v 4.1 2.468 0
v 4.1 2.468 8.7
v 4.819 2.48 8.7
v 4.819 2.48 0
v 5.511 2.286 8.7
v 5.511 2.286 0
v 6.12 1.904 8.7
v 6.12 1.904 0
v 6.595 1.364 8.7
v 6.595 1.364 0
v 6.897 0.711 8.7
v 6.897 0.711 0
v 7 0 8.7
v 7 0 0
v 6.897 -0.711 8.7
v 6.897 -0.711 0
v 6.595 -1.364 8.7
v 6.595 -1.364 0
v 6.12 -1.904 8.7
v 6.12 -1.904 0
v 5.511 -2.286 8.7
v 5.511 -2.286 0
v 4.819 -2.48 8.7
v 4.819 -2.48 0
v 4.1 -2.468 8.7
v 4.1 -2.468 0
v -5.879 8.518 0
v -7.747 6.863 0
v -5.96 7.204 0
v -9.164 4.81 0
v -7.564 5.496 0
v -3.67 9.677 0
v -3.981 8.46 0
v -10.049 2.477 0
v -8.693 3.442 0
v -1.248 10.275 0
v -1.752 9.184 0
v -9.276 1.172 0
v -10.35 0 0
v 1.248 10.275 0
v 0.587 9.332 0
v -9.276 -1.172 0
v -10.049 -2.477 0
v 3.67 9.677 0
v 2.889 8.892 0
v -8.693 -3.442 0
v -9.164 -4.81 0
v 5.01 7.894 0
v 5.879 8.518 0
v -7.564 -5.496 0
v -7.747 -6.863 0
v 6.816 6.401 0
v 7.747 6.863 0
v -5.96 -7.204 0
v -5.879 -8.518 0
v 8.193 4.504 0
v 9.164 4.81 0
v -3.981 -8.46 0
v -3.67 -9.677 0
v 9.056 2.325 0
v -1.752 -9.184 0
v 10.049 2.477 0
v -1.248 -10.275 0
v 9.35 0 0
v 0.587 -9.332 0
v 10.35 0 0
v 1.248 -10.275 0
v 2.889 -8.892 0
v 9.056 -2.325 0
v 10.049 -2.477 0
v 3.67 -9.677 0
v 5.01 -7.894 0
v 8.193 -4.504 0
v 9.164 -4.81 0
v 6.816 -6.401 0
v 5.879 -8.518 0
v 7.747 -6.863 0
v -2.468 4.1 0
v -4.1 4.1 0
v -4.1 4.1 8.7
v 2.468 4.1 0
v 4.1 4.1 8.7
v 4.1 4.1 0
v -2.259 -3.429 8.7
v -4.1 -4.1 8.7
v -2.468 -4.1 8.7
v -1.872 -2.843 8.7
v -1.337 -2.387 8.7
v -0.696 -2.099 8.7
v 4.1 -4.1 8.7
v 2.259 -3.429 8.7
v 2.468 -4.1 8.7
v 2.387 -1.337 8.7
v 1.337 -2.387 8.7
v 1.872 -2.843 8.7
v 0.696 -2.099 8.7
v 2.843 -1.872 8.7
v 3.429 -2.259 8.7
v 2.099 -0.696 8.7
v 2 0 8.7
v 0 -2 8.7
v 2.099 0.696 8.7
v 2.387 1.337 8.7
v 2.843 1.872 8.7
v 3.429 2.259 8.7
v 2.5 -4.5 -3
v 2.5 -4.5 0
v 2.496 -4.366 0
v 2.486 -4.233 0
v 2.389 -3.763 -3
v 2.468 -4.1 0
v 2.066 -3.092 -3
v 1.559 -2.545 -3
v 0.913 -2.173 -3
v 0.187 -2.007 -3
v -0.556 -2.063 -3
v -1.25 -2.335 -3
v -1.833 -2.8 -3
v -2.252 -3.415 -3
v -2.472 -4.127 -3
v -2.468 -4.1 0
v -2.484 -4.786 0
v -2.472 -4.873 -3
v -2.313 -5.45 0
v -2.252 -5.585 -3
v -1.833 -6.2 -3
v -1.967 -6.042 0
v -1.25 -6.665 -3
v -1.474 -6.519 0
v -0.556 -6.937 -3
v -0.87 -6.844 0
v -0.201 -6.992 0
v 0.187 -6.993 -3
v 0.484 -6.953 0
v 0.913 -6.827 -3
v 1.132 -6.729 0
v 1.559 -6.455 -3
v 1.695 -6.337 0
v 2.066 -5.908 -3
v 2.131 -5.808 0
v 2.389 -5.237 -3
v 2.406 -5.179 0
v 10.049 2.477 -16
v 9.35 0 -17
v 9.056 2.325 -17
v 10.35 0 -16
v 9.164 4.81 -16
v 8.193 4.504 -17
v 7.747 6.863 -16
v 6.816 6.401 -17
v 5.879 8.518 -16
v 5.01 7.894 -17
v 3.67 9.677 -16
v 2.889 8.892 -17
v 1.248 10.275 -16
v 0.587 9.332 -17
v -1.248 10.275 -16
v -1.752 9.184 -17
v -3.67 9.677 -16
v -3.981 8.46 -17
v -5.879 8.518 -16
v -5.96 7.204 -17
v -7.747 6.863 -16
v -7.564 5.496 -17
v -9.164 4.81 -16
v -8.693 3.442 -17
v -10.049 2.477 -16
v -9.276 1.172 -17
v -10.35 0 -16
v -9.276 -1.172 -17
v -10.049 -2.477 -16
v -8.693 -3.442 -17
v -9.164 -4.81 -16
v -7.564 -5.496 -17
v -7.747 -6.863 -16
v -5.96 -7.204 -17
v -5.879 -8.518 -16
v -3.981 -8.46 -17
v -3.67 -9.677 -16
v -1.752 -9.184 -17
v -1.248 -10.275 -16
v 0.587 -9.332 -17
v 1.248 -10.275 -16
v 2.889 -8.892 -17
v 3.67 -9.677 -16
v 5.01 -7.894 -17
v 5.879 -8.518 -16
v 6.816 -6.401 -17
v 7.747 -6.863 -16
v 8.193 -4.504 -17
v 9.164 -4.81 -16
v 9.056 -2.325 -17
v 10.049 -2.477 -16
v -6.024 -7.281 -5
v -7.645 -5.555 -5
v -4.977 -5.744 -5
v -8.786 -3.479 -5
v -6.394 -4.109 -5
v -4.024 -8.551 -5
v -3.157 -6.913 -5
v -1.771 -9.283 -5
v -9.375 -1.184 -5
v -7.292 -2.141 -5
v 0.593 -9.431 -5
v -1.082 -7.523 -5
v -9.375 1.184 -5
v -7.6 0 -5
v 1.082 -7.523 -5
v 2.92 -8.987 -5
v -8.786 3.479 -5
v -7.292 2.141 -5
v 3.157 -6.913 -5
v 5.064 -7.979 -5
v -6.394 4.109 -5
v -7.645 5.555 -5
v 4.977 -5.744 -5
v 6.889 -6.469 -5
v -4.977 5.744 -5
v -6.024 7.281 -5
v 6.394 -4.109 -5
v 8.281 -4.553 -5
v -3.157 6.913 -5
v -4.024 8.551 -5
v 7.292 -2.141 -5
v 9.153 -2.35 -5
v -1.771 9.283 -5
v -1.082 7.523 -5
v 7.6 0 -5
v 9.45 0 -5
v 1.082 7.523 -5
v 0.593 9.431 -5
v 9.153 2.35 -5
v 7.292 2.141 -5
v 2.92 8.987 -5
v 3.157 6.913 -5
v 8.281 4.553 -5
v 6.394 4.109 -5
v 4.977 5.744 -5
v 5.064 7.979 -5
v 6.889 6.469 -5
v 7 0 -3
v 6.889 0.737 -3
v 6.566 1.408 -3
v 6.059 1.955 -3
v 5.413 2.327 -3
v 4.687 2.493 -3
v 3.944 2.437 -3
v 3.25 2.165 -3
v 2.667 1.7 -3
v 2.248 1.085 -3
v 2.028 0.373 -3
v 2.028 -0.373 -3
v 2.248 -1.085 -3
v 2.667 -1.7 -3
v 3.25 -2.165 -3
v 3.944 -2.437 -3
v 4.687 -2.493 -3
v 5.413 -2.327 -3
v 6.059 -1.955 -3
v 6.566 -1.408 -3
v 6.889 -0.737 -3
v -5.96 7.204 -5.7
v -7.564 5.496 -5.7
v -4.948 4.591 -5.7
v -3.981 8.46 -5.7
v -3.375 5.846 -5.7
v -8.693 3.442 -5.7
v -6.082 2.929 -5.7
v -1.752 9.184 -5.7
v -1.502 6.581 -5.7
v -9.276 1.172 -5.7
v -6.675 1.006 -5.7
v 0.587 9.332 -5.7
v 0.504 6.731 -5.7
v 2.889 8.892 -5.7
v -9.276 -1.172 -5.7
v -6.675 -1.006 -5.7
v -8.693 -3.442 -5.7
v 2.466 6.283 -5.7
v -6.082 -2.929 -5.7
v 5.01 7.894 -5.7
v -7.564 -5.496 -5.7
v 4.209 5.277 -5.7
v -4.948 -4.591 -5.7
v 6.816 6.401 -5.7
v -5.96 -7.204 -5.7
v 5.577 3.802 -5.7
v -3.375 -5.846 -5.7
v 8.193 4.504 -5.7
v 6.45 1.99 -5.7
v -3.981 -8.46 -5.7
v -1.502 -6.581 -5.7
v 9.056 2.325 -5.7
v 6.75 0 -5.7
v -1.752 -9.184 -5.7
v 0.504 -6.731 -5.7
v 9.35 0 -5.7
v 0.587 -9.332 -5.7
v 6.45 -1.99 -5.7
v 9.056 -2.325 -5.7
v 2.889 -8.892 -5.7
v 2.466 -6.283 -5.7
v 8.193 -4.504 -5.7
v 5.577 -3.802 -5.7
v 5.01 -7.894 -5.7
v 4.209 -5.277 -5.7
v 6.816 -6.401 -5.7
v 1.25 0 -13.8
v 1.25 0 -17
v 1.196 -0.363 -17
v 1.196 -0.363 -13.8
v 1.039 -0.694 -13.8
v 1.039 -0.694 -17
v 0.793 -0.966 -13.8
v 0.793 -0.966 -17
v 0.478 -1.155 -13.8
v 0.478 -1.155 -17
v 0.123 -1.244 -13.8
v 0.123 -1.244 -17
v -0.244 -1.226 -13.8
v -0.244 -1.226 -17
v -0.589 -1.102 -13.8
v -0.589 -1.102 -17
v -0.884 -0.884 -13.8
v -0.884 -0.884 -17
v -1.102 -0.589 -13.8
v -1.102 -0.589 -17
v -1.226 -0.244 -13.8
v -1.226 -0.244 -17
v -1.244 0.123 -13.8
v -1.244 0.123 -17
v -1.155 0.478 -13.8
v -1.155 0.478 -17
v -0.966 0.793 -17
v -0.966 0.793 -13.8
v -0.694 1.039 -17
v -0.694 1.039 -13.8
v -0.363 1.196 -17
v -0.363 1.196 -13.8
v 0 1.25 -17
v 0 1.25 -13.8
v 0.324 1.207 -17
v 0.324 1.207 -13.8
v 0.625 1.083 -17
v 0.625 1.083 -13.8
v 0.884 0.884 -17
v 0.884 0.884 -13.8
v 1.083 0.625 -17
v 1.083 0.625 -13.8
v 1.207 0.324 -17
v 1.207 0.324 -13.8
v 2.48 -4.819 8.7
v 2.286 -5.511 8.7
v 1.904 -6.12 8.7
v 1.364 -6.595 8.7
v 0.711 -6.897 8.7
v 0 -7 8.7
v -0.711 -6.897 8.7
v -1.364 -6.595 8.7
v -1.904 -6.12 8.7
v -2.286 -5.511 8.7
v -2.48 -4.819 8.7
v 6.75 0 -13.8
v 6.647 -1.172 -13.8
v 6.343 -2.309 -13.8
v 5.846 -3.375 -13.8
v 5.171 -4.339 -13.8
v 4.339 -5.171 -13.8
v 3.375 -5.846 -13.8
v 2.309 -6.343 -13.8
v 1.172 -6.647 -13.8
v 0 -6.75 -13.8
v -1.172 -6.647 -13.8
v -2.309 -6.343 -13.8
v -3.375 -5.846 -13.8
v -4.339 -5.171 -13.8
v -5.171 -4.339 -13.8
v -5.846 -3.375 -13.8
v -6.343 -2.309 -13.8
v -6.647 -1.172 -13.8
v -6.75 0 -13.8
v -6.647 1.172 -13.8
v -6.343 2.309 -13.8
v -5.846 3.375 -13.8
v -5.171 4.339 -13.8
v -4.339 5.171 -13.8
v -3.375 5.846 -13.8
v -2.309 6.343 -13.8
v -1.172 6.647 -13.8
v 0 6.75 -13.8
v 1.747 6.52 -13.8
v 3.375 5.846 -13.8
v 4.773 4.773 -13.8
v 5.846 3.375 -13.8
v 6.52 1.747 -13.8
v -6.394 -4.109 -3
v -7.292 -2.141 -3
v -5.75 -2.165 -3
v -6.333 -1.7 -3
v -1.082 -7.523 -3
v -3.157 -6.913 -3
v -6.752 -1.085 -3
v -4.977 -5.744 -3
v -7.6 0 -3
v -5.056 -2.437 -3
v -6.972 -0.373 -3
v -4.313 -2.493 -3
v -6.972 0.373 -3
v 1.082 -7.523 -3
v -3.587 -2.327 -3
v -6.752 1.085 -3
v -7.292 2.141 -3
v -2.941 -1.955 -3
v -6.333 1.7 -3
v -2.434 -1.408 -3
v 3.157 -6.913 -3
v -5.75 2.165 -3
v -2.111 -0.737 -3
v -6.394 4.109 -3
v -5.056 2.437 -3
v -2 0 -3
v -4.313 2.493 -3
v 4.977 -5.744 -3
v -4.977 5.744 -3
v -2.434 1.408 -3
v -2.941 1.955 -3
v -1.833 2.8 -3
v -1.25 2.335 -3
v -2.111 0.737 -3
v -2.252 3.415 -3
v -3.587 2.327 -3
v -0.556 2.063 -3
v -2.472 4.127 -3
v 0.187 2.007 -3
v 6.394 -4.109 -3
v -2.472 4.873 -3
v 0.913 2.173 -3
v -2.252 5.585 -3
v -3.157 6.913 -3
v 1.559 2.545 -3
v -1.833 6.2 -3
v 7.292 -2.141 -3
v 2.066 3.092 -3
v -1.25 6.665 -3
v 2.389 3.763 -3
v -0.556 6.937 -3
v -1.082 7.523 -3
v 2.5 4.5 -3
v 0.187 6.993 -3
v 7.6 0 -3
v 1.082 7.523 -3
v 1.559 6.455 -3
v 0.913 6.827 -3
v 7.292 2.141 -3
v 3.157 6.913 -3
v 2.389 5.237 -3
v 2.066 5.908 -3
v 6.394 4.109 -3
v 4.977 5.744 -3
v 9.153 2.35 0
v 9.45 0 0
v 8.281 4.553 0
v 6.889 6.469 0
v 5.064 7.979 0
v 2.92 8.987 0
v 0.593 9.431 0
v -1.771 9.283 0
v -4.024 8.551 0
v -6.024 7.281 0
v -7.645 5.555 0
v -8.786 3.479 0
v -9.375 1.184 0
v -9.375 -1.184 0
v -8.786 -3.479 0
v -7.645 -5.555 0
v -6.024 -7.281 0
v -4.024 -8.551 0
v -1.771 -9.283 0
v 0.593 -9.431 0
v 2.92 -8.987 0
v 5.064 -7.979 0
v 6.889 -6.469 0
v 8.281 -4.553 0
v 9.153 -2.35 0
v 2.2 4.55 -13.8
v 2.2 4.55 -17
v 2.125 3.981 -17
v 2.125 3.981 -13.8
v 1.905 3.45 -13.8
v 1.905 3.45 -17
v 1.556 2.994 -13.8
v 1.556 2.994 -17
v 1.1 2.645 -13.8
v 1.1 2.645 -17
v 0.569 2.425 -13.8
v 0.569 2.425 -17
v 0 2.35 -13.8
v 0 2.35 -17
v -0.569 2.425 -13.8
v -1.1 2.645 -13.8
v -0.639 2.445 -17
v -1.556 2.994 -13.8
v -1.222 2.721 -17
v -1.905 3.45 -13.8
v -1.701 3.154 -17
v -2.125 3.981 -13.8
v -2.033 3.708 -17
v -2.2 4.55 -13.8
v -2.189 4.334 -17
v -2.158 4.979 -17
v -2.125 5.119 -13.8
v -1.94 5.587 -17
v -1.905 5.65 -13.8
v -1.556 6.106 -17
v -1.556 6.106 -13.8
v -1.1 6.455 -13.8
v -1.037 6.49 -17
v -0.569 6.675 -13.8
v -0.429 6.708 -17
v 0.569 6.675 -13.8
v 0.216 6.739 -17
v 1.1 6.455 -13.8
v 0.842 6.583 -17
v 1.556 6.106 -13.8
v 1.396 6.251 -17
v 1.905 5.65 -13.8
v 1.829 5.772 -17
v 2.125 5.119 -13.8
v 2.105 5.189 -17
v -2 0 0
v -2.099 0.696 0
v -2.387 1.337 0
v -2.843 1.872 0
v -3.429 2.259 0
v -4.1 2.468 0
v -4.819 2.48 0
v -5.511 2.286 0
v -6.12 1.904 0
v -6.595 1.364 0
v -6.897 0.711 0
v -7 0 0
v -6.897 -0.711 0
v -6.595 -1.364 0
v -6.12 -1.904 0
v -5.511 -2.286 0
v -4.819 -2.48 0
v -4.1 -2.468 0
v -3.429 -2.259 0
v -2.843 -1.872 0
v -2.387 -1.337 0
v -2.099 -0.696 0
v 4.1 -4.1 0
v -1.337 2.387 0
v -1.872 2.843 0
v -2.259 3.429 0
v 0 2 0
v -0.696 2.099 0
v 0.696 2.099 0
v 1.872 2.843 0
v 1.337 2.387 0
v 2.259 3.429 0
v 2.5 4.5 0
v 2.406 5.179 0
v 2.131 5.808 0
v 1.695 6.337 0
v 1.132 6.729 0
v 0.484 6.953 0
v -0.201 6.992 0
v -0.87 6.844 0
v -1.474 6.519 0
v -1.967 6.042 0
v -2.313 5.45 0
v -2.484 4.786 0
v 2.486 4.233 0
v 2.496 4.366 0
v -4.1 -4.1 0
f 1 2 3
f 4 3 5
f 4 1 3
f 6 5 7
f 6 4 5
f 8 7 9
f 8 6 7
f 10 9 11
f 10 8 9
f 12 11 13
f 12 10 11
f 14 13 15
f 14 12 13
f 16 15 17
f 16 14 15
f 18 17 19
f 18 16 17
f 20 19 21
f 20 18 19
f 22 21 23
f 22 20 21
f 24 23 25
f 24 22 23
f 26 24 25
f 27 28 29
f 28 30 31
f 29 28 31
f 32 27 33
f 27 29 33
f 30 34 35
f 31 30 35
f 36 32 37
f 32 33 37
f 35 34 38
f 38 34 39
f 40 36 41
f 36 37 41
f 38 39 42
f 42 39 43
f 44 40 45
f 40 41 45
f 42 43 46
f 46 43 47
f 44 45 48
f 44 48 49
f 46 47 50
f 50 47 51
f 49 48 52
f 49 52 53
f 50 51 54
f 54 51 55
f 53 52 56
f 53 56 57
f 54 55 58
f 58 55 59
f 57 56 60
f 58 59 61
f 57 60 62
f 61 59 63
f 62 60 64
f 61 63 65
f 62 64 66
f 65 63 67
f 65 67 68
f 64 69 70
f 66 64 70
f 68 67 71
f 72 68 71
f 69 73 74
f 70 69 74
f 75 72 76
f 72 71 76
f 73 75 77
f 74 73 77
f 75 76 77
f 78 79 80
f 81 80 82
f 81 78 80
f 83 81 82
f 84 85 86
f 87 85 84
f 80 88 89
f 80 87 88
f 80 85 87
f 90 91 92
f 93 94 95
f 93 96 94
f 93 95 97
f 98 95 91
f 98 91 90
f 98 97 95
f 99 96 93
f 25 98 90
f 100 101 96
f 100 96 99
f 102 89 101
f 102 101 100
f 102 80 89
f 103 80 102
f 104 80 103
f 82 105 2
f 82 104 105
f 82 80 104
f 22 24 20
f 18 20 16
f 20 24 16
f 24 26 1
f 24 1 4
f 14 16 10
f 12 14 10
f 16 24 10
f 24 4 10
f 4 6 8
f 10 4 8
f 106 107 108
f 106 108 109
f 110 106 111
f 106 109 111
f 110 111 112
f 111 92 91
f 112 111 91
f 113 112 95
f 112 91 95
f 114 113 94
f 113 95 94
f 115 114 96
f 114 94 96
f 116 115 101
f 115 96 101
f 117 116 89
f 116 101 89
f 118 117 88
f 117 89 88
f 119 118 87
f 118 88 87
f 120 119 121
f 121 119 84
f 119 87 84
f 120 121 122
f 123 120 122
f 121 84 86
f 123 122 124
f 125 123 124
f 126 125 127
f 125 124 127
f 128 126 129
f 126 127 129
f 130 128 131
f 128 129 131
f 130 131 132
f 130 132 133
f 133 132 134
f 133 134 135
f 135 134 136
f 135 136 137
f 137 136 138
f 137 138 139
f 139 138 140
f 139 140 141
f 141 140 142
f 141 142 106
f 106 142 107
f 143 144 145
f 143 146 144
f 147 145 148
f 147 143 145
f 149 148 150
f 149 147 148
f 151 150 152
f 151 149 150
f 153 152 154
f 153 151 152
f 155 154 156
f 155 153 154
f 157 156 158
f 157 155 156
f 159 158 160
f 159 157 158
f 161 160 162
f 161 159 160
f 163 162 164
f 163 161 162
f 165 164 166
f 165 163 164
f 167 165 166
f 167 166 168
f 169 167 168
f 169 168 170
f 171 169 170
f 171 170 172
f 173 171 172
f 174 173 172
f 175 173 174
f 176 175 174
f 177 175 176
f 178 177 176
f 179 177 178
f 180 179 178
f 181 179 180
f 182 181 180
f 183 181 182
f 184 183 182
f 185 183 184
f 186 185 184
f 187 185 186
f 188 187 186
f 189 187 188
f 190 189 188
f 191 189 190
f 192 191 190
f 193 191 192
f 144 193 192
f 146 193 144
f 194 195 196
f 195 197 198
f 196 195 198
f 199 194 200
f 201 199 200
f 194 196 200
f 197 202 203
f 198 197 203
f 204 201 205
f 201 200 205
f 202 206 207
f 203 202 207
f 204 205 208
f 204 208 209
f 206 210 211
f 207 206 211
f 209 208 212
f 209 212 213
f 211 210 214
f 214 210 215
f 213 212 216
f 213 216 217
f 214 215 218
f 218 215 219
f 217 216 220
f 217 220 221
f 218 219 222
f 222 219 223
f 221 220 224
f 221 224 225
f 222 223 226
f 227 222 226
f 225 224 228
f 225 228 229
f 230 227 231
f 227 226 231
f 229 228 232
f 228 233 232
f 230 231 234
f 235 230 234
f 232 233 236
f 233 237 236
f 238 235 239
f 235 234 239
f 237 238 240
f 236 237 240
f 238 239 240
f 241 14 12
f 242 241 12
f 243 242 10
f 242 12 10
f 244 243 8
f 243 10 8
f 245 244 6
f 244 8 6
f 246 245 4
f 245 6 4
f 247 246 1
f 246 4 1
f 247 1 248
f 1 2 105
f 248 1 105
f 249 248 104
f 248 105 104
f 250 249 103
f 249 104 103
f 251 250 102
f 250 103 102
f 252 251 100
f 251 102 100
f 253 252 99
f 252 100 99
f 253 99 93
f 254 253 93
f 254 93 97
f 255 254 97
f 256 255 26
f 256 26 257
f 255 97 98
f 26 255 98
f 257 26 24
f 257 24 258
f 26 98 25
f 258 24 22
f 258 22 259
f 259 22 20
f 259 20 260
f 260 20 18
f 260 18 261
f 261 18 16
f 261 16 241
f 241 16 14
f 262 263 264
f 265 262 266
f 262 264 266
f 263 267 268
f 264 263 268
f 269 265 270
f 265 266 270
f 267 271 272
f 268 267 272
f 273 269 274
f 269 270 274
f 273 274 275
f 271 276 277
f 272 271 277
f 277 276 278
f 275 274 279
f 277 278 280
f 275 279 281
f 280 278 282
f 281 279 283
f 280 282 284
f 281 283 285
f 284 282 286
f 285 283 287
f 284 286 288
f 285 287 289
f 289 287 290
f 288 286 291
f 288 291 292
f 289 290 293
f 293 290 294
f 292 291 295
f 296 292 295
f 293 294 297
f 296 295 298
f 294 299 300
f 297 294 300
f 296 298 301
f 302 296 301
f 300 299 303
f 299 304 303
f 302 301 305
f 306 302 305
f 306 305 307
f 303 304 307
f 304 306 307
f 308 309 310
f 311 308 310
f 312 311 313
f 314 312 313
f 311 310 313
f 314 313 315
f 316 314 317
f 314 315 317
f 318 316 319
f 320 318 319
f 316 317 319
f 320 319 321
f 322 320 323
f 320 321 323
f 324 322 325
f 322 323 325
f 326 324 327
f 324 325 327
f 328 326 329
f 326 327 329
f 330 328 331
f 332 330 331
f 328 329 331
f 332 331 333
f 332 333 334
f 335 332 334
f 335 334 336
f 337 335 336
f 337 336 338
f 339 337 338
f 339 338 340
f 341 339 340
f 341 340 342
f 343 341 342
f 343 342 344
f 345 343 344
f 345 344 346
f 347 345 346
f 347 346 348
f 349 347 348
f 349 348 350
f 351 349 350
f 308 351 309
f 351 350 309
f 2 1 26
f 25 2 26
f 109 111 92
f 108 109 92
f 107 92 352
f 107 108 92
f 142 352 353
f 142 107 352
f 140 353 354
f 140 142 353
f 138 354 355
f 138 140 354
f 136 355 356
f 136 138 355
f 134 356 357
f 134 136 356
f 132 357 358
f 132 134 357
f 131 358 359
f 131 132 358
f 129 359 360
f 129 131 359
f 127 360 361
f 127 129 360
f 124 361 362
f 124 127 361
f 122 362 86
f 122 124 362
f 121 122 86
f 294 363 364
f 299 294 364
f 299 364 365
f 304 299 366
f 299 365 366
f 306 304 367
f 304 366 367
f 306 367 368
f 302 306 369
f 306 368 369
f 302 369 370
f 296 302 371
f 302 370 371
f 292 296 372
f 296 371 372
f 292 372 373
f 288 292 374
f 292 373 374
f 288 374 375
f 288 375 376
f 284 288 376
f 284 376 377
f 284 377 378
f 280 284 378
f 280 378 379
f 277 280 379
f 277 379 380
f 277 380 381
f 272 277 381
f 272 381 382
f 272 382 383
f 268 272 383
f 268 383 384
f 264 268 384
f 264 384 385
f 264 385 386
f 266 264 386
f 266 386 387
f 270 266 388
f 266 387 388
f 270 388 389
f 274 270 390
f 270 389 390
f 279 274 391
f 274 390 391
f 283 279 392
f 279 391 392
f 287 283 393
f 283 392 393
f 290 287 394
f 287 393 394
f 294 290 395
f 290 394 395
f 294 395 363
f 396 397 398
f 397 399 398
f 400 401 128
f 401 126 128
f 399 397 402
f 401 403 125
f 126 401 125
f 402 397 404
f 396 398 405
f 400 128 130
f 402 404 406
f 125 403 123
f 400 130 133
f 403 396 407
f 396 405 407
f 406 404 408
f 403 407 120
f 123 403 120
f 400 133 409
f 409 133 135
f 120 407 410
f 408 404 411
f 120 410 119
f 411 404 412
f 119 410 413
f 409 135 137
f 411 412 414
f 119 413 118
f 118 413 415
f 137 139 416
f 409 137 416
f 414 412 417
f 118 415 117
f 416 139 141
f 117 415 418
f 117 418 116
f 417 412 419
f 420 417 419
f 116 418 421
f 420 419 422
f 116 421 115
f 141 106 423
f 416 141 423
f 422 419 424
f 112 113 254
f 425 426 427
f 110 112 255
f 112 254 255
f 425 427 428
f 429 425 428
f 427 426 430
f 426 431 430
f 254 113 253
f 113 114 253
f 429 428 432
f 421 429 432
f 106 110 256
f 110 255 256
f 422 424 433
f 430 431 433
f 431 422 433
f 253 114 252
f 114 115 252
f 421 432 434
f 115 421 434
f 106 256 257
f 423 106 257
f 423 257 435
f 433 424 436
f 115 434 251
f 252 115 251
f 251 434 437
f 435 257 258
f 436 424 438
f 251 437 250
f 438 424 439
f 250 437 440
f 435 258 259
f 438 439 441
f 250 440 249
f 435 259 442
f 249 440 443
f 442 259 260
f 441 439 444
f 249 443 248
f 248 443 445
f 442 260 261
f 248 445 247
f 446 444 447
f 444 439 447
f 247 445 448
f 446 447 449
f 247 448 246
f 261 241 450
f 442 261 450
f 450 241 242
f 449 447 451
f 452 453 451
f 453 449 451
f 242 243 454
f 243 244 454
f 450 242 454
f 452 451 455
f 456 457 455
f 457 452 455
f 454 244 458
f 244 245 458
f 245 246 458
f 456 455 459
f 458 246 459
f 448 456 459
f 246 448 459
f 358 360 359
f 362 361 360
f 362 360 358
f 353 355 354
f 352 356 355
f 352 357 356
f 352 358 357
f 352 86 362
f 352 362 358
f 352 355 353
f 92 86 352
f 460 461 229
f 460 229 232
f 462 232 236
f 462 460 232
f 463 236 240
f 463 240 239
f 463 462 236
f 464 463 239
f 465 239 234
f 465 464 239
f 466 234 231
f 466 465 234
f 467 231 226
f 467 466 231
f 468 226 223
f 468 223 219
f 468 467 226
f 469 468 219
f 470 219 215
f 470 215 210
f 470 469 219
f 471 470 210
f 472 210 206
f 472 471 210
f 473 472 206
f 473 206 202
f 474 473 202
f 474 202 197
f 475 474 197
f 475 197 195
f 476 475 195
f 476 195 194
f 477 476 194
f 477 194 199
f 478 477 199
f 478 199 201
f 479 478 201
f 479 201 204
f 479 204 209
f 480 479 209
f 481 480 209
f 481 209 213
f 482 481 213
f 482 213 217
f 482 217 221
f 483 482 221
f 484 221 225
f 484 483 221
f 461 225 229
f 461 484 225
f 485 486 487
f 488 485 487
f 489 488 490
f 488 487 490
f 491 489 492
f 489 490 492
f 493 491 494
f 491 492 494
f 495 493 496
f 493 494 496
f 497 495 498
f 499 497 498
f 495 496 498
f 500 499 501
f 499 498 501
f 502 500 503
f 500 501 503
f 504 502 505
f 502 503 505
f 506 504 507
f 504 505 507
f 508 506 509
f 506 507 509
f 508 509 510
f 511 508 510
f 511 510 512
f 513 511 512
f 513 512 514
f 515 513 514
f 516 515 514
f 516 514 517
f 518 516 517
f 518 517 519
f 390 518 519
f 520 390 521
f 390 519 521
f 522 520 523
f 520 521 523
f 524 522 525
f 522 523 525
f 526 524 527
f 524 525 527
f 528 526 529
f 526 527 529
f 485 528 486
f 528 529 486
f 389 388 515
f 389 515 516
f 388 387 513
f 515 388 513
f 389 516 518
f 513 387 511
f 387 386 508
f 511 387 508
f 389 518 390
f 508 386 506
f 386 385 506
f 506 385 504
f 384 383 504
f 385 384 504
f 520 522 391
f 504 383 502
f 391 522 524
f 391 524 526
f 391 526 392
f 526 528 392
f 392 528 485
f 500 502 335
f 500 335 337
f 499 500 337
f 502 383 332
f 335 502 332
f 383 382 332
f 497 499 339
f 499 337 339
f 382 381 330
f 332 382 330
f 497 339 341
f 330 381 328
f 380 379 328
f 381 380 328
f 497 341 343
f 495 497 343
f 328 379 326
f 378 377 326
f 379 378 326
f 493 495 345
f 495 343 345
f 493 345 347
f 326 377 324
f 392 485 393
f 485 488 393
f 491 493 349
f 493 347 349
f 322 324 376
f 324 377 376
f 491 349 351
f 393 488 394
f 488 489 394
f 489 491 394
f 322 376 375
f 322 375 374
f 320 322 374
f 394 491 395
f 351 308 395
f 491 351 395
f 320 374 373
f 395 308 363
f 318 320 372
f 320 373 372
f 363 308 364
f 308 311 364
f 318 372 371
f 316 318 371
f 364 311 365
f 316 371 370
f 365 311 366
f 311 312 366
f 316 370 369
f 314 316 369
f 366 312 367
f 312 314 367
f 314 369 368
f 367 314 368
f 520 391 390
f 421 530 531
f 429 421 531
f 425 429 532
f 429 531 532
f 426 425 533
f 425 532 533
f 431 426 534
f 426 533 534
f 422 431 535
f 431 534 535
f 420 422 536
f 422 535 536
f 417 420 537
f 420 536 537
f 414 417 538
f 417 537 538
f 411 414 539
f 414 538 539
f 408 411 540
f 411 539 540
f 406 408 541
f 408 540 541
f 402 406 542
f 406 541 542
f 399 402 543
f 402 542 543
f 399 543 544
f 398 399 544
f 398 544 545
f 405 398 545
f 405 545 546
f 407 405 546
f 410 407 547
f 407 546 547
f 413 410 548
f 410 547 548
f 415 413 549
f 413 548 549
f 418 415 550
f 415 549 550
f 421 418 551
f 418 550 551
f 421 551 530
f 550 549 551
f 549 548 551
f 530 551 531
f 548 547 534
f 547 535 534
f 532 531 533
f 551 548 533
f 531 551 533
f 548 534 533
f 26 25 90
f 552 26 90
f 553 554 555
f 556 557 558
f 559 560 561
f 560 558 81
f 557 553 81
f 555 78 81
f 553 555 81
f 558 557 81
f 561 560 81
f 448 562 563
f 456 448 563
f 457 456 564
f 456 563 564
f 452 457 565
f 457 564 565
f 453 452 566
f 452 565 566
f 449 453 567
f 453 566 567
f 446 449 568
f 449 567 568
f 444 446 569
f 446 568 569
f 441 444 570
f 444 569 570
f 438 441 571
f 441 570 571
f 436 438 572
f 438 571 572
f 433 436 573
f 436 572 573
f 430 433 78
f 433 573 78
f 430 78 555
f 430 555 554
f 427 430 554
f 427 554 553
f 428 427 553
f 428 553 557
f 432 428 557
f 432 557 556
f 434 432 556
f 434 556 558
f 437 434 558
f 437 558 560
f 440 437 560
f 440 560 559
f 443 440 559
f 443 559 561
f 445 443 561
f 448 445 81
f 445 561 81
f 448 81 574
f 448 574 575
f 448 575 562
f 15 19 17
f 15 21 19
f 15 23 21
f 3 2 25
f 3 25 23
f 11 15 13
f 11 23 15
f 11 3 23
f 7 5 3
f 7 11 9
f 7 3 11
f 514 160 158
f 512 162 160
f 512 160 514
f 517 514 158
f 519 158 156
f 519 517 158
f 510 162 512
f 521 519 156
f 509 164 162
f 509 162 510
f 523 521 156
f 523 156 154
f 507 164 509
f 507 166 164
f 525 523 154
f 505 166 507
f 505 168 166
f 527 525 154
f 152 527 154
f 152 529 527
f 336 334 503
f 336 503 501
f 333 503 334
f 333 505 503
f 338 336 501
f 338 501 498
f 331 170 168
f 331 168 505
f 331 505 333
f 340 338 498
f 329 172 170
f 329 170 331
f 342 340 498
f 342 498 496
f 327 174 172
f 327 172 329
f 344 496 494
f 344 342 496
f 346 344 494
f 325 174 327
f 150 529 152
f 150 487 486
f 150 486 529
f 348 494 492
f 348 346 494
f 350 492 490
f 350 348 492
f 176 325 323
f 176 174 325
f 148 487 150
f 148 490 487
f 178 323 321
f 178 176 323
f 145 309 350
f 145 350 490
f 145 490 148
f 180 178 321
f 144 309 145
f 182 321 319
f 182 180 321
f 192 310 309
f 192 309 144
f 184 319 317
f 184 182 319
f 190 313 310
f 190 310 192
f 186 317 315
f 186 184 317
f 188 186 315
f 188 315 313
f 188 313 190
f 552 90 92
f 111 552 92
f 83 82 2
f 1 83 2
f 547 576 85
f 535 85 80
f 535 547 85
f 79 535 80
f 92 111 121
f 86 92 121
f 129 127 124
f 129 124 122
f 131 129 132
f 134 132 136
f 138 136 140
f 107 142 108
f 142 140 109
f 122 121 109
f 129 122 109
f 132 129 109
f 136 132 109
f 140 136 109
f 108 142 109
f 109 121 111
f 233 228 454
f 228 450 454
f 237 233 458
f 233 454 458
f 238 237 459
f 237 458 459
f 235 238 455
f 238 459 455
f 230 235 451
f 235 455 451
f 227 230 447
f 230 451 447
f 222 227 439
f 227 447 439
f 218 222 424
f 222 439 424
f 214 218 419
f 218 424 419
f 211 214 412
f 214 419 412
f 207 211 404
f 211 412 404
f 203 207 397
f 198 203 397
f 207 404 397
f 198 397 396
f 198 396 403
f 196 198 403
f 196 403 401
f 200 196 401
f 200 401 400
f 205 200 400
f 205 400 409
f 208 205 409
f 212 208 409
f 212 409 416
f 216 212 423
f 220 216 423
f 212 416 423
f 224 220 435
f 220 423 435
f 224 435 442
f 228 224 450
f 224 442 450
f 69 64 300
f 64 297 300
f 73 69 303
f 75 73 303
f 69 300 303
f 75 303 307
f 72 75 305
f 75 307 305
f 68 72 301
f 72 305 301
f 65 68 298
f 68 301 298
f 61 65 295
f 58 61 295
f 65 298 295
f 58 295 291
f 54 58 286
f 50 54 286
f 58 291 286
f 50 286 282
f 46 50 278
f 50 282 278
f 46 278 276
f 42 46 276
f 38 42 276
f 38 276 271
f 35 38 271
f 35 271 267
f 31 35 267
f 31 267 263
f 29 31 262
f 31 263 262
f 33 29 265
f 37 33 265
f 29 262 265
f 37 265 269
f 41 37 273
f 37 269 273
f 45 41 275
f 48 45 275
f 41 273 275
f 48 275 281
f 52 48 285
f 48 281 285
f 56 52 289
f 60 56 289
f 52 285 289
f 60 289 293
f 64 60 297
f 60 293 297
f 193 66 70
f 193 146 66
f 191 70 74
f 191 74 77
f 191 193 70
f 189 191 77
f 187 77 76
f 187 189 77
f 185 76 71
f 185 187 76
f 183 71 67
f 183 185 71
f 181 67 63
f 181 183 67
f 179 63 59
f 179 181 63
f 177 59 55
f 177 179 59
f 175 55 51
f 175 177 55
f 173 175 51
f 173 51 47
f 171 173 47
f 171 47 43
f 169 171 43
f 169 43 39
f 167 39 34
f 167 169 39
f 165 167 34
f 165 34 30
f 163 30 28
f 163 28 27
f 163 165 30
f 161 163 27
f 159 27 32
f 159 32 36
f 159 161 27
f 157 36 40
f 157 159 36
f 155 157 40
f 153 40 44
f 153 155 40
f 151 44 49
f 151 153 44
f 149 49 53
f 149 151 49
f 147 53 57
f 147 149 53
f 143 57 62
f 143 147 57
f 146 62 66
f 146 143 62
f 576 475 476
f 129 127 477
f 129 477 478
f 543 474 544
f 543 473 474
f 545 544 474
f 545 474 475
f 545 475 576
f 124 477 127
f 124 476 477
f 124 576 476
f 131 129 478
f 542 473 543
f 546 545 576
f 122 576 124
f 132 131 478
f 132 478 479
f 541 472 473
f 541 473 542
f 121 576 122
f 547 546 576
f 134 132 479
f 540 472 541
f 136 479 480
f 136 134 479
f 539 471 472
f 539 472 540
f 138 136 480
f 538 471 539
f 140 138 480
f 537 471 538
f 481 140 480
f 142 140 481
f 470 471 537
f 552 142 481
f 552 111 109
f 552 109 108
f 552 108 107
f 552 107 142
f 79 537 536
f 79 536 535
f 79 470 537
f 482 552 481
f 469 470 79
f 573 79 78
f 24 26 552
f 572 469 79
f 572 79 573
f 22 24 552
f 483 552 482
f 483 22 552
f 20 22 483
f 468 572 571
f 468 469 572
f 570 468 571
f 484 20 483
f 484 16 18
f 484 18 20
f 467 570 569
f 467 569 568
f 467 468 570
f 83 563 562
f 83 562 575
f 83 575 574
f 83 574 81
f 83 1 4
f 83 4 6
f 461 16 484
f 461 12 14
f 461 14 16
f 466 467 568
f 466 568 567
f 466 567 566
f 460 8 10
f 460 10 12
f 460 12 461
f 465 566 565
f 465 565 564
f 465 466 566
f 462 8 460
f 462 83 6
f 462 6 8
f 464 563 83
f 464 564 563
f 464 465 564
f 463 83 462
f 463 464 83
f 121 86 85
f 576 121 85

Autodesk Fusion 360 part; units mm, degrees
sketch "Skizze1" plane through (0, 0, 0) normal (0, 0, 1) x (1, 0, 0)
  circle A0 centre (0, 0) radius 9.45
  line L0 (-4.1, 4.1) -> (4.1, 4.1)
  line L1 (4.1, 4.1) -> (4.1, -4.1)
  line L2 (4.1, -4.1) -> (-4.1, -4.1)
  line L3 (-4.1, -4.1) -> (-4.1, 4.1)
  line L4 (-4.1, 0) -> (4.1, 0) construction
  line L5 (0, 4.1) -> (0, -4.1) construction
  circle A1 centre (4.5, 0) radius 2.5
  circle A2 centre (0, 4.5) radius 2.5
  circle A3 centre (-4.5, 0) radius 2.5
  circle A4 centre (0, -4.5) radius 2.5
  circle A5 centre (0, 0) radius 7.6
  dimension "d18" = 18.9
  dimension "d19" = 8.2
  dimension "d20" = 8.2
  dimension "d21" = 5
  dimension "d22" = 4.5
  dimension "d24" = 360
  dimension "d25" = 15.2
extrude "Extrusion1" add sketch "Skizze1" against normal blind 3 contours A0 | L0 L1 L2 L3 A1 A2 A3 A4 | A5 makes body 1
extrude "Extrusion2" add sketch "Skizze1" against normal blind 5 contours A0 bodies 1
extrude "Extrusion3" add sketch "Skizze1" along normal blind 8.7 contours L0 L1 L2 L3 A1 A2 A3 A4 | L0 A2 | L3 A3 | L1 A1 | L2 A4 picked at (-0.6822, 3.4278) picked at (-2.9892, -0.0816) picked at (5.1777, 0.1304) picked at (-0.1263, -5.057) bodies 1
sketch "Skizze2" plane through (0, 0, 0) normal (0, 0, 1) x (1, 0, 0)
  circle A0 centre (0, 0) radius 10.35
  circle A1 centre (0, 0) radius 9.35
  circle A2 centre (0, 0) radius 6.75
  circle A3 centre (0, 0) radius 1.25
  circle A4 centre (0, -4.55) radius 2.2
  line L0 (0, -4.55) -> (0, 0)
  dimension "d32" = 20.7
  dimension "d33" = 18.7
  dimension "d34" = 13.5
  dimension "d35" = 2.5
  dimension "d36" = 4.4
extrude "Extrusion4" add sketch "Skizze2" against normal blind 17 separate body contours A0 makes body 2
extrude "Extrusion6" add sketch "Skizze2" against normal blind 11.3 contours A1 bodies 2
extrude "Extrusion7" add sketch "Skizze2" against normal blind 3.2 contours A2 bodies 2
thread "Gewinde1"
chamfer "Fase1" distance 1 angle 45 1 edges at (-9.6496, -3.7427, 0) on bodies 2
copy_body "Körper->Berechn1" bodies 1 removing the originals makes body 3 in component "lid"
copy_body "Körper->Berechn2" bodies 2 removing the originals makes body 4 in component "body"
component "lid" placed x (1, 0, 0) y (0, 1, 0) z (0, 0, 1) at (0, 0, 0)
component "body" placed x (1, 0, 0) y (0, -1, 0) z (0, 0, -1) at (0, 0, -17)
equation "d22 = ( 14 / 2 ) * 1 mm - 2.5 mm"
equation "d41 = -17 mm + 5.7 mm"
equation "d43 = -17 mm + 13.8 mm"
